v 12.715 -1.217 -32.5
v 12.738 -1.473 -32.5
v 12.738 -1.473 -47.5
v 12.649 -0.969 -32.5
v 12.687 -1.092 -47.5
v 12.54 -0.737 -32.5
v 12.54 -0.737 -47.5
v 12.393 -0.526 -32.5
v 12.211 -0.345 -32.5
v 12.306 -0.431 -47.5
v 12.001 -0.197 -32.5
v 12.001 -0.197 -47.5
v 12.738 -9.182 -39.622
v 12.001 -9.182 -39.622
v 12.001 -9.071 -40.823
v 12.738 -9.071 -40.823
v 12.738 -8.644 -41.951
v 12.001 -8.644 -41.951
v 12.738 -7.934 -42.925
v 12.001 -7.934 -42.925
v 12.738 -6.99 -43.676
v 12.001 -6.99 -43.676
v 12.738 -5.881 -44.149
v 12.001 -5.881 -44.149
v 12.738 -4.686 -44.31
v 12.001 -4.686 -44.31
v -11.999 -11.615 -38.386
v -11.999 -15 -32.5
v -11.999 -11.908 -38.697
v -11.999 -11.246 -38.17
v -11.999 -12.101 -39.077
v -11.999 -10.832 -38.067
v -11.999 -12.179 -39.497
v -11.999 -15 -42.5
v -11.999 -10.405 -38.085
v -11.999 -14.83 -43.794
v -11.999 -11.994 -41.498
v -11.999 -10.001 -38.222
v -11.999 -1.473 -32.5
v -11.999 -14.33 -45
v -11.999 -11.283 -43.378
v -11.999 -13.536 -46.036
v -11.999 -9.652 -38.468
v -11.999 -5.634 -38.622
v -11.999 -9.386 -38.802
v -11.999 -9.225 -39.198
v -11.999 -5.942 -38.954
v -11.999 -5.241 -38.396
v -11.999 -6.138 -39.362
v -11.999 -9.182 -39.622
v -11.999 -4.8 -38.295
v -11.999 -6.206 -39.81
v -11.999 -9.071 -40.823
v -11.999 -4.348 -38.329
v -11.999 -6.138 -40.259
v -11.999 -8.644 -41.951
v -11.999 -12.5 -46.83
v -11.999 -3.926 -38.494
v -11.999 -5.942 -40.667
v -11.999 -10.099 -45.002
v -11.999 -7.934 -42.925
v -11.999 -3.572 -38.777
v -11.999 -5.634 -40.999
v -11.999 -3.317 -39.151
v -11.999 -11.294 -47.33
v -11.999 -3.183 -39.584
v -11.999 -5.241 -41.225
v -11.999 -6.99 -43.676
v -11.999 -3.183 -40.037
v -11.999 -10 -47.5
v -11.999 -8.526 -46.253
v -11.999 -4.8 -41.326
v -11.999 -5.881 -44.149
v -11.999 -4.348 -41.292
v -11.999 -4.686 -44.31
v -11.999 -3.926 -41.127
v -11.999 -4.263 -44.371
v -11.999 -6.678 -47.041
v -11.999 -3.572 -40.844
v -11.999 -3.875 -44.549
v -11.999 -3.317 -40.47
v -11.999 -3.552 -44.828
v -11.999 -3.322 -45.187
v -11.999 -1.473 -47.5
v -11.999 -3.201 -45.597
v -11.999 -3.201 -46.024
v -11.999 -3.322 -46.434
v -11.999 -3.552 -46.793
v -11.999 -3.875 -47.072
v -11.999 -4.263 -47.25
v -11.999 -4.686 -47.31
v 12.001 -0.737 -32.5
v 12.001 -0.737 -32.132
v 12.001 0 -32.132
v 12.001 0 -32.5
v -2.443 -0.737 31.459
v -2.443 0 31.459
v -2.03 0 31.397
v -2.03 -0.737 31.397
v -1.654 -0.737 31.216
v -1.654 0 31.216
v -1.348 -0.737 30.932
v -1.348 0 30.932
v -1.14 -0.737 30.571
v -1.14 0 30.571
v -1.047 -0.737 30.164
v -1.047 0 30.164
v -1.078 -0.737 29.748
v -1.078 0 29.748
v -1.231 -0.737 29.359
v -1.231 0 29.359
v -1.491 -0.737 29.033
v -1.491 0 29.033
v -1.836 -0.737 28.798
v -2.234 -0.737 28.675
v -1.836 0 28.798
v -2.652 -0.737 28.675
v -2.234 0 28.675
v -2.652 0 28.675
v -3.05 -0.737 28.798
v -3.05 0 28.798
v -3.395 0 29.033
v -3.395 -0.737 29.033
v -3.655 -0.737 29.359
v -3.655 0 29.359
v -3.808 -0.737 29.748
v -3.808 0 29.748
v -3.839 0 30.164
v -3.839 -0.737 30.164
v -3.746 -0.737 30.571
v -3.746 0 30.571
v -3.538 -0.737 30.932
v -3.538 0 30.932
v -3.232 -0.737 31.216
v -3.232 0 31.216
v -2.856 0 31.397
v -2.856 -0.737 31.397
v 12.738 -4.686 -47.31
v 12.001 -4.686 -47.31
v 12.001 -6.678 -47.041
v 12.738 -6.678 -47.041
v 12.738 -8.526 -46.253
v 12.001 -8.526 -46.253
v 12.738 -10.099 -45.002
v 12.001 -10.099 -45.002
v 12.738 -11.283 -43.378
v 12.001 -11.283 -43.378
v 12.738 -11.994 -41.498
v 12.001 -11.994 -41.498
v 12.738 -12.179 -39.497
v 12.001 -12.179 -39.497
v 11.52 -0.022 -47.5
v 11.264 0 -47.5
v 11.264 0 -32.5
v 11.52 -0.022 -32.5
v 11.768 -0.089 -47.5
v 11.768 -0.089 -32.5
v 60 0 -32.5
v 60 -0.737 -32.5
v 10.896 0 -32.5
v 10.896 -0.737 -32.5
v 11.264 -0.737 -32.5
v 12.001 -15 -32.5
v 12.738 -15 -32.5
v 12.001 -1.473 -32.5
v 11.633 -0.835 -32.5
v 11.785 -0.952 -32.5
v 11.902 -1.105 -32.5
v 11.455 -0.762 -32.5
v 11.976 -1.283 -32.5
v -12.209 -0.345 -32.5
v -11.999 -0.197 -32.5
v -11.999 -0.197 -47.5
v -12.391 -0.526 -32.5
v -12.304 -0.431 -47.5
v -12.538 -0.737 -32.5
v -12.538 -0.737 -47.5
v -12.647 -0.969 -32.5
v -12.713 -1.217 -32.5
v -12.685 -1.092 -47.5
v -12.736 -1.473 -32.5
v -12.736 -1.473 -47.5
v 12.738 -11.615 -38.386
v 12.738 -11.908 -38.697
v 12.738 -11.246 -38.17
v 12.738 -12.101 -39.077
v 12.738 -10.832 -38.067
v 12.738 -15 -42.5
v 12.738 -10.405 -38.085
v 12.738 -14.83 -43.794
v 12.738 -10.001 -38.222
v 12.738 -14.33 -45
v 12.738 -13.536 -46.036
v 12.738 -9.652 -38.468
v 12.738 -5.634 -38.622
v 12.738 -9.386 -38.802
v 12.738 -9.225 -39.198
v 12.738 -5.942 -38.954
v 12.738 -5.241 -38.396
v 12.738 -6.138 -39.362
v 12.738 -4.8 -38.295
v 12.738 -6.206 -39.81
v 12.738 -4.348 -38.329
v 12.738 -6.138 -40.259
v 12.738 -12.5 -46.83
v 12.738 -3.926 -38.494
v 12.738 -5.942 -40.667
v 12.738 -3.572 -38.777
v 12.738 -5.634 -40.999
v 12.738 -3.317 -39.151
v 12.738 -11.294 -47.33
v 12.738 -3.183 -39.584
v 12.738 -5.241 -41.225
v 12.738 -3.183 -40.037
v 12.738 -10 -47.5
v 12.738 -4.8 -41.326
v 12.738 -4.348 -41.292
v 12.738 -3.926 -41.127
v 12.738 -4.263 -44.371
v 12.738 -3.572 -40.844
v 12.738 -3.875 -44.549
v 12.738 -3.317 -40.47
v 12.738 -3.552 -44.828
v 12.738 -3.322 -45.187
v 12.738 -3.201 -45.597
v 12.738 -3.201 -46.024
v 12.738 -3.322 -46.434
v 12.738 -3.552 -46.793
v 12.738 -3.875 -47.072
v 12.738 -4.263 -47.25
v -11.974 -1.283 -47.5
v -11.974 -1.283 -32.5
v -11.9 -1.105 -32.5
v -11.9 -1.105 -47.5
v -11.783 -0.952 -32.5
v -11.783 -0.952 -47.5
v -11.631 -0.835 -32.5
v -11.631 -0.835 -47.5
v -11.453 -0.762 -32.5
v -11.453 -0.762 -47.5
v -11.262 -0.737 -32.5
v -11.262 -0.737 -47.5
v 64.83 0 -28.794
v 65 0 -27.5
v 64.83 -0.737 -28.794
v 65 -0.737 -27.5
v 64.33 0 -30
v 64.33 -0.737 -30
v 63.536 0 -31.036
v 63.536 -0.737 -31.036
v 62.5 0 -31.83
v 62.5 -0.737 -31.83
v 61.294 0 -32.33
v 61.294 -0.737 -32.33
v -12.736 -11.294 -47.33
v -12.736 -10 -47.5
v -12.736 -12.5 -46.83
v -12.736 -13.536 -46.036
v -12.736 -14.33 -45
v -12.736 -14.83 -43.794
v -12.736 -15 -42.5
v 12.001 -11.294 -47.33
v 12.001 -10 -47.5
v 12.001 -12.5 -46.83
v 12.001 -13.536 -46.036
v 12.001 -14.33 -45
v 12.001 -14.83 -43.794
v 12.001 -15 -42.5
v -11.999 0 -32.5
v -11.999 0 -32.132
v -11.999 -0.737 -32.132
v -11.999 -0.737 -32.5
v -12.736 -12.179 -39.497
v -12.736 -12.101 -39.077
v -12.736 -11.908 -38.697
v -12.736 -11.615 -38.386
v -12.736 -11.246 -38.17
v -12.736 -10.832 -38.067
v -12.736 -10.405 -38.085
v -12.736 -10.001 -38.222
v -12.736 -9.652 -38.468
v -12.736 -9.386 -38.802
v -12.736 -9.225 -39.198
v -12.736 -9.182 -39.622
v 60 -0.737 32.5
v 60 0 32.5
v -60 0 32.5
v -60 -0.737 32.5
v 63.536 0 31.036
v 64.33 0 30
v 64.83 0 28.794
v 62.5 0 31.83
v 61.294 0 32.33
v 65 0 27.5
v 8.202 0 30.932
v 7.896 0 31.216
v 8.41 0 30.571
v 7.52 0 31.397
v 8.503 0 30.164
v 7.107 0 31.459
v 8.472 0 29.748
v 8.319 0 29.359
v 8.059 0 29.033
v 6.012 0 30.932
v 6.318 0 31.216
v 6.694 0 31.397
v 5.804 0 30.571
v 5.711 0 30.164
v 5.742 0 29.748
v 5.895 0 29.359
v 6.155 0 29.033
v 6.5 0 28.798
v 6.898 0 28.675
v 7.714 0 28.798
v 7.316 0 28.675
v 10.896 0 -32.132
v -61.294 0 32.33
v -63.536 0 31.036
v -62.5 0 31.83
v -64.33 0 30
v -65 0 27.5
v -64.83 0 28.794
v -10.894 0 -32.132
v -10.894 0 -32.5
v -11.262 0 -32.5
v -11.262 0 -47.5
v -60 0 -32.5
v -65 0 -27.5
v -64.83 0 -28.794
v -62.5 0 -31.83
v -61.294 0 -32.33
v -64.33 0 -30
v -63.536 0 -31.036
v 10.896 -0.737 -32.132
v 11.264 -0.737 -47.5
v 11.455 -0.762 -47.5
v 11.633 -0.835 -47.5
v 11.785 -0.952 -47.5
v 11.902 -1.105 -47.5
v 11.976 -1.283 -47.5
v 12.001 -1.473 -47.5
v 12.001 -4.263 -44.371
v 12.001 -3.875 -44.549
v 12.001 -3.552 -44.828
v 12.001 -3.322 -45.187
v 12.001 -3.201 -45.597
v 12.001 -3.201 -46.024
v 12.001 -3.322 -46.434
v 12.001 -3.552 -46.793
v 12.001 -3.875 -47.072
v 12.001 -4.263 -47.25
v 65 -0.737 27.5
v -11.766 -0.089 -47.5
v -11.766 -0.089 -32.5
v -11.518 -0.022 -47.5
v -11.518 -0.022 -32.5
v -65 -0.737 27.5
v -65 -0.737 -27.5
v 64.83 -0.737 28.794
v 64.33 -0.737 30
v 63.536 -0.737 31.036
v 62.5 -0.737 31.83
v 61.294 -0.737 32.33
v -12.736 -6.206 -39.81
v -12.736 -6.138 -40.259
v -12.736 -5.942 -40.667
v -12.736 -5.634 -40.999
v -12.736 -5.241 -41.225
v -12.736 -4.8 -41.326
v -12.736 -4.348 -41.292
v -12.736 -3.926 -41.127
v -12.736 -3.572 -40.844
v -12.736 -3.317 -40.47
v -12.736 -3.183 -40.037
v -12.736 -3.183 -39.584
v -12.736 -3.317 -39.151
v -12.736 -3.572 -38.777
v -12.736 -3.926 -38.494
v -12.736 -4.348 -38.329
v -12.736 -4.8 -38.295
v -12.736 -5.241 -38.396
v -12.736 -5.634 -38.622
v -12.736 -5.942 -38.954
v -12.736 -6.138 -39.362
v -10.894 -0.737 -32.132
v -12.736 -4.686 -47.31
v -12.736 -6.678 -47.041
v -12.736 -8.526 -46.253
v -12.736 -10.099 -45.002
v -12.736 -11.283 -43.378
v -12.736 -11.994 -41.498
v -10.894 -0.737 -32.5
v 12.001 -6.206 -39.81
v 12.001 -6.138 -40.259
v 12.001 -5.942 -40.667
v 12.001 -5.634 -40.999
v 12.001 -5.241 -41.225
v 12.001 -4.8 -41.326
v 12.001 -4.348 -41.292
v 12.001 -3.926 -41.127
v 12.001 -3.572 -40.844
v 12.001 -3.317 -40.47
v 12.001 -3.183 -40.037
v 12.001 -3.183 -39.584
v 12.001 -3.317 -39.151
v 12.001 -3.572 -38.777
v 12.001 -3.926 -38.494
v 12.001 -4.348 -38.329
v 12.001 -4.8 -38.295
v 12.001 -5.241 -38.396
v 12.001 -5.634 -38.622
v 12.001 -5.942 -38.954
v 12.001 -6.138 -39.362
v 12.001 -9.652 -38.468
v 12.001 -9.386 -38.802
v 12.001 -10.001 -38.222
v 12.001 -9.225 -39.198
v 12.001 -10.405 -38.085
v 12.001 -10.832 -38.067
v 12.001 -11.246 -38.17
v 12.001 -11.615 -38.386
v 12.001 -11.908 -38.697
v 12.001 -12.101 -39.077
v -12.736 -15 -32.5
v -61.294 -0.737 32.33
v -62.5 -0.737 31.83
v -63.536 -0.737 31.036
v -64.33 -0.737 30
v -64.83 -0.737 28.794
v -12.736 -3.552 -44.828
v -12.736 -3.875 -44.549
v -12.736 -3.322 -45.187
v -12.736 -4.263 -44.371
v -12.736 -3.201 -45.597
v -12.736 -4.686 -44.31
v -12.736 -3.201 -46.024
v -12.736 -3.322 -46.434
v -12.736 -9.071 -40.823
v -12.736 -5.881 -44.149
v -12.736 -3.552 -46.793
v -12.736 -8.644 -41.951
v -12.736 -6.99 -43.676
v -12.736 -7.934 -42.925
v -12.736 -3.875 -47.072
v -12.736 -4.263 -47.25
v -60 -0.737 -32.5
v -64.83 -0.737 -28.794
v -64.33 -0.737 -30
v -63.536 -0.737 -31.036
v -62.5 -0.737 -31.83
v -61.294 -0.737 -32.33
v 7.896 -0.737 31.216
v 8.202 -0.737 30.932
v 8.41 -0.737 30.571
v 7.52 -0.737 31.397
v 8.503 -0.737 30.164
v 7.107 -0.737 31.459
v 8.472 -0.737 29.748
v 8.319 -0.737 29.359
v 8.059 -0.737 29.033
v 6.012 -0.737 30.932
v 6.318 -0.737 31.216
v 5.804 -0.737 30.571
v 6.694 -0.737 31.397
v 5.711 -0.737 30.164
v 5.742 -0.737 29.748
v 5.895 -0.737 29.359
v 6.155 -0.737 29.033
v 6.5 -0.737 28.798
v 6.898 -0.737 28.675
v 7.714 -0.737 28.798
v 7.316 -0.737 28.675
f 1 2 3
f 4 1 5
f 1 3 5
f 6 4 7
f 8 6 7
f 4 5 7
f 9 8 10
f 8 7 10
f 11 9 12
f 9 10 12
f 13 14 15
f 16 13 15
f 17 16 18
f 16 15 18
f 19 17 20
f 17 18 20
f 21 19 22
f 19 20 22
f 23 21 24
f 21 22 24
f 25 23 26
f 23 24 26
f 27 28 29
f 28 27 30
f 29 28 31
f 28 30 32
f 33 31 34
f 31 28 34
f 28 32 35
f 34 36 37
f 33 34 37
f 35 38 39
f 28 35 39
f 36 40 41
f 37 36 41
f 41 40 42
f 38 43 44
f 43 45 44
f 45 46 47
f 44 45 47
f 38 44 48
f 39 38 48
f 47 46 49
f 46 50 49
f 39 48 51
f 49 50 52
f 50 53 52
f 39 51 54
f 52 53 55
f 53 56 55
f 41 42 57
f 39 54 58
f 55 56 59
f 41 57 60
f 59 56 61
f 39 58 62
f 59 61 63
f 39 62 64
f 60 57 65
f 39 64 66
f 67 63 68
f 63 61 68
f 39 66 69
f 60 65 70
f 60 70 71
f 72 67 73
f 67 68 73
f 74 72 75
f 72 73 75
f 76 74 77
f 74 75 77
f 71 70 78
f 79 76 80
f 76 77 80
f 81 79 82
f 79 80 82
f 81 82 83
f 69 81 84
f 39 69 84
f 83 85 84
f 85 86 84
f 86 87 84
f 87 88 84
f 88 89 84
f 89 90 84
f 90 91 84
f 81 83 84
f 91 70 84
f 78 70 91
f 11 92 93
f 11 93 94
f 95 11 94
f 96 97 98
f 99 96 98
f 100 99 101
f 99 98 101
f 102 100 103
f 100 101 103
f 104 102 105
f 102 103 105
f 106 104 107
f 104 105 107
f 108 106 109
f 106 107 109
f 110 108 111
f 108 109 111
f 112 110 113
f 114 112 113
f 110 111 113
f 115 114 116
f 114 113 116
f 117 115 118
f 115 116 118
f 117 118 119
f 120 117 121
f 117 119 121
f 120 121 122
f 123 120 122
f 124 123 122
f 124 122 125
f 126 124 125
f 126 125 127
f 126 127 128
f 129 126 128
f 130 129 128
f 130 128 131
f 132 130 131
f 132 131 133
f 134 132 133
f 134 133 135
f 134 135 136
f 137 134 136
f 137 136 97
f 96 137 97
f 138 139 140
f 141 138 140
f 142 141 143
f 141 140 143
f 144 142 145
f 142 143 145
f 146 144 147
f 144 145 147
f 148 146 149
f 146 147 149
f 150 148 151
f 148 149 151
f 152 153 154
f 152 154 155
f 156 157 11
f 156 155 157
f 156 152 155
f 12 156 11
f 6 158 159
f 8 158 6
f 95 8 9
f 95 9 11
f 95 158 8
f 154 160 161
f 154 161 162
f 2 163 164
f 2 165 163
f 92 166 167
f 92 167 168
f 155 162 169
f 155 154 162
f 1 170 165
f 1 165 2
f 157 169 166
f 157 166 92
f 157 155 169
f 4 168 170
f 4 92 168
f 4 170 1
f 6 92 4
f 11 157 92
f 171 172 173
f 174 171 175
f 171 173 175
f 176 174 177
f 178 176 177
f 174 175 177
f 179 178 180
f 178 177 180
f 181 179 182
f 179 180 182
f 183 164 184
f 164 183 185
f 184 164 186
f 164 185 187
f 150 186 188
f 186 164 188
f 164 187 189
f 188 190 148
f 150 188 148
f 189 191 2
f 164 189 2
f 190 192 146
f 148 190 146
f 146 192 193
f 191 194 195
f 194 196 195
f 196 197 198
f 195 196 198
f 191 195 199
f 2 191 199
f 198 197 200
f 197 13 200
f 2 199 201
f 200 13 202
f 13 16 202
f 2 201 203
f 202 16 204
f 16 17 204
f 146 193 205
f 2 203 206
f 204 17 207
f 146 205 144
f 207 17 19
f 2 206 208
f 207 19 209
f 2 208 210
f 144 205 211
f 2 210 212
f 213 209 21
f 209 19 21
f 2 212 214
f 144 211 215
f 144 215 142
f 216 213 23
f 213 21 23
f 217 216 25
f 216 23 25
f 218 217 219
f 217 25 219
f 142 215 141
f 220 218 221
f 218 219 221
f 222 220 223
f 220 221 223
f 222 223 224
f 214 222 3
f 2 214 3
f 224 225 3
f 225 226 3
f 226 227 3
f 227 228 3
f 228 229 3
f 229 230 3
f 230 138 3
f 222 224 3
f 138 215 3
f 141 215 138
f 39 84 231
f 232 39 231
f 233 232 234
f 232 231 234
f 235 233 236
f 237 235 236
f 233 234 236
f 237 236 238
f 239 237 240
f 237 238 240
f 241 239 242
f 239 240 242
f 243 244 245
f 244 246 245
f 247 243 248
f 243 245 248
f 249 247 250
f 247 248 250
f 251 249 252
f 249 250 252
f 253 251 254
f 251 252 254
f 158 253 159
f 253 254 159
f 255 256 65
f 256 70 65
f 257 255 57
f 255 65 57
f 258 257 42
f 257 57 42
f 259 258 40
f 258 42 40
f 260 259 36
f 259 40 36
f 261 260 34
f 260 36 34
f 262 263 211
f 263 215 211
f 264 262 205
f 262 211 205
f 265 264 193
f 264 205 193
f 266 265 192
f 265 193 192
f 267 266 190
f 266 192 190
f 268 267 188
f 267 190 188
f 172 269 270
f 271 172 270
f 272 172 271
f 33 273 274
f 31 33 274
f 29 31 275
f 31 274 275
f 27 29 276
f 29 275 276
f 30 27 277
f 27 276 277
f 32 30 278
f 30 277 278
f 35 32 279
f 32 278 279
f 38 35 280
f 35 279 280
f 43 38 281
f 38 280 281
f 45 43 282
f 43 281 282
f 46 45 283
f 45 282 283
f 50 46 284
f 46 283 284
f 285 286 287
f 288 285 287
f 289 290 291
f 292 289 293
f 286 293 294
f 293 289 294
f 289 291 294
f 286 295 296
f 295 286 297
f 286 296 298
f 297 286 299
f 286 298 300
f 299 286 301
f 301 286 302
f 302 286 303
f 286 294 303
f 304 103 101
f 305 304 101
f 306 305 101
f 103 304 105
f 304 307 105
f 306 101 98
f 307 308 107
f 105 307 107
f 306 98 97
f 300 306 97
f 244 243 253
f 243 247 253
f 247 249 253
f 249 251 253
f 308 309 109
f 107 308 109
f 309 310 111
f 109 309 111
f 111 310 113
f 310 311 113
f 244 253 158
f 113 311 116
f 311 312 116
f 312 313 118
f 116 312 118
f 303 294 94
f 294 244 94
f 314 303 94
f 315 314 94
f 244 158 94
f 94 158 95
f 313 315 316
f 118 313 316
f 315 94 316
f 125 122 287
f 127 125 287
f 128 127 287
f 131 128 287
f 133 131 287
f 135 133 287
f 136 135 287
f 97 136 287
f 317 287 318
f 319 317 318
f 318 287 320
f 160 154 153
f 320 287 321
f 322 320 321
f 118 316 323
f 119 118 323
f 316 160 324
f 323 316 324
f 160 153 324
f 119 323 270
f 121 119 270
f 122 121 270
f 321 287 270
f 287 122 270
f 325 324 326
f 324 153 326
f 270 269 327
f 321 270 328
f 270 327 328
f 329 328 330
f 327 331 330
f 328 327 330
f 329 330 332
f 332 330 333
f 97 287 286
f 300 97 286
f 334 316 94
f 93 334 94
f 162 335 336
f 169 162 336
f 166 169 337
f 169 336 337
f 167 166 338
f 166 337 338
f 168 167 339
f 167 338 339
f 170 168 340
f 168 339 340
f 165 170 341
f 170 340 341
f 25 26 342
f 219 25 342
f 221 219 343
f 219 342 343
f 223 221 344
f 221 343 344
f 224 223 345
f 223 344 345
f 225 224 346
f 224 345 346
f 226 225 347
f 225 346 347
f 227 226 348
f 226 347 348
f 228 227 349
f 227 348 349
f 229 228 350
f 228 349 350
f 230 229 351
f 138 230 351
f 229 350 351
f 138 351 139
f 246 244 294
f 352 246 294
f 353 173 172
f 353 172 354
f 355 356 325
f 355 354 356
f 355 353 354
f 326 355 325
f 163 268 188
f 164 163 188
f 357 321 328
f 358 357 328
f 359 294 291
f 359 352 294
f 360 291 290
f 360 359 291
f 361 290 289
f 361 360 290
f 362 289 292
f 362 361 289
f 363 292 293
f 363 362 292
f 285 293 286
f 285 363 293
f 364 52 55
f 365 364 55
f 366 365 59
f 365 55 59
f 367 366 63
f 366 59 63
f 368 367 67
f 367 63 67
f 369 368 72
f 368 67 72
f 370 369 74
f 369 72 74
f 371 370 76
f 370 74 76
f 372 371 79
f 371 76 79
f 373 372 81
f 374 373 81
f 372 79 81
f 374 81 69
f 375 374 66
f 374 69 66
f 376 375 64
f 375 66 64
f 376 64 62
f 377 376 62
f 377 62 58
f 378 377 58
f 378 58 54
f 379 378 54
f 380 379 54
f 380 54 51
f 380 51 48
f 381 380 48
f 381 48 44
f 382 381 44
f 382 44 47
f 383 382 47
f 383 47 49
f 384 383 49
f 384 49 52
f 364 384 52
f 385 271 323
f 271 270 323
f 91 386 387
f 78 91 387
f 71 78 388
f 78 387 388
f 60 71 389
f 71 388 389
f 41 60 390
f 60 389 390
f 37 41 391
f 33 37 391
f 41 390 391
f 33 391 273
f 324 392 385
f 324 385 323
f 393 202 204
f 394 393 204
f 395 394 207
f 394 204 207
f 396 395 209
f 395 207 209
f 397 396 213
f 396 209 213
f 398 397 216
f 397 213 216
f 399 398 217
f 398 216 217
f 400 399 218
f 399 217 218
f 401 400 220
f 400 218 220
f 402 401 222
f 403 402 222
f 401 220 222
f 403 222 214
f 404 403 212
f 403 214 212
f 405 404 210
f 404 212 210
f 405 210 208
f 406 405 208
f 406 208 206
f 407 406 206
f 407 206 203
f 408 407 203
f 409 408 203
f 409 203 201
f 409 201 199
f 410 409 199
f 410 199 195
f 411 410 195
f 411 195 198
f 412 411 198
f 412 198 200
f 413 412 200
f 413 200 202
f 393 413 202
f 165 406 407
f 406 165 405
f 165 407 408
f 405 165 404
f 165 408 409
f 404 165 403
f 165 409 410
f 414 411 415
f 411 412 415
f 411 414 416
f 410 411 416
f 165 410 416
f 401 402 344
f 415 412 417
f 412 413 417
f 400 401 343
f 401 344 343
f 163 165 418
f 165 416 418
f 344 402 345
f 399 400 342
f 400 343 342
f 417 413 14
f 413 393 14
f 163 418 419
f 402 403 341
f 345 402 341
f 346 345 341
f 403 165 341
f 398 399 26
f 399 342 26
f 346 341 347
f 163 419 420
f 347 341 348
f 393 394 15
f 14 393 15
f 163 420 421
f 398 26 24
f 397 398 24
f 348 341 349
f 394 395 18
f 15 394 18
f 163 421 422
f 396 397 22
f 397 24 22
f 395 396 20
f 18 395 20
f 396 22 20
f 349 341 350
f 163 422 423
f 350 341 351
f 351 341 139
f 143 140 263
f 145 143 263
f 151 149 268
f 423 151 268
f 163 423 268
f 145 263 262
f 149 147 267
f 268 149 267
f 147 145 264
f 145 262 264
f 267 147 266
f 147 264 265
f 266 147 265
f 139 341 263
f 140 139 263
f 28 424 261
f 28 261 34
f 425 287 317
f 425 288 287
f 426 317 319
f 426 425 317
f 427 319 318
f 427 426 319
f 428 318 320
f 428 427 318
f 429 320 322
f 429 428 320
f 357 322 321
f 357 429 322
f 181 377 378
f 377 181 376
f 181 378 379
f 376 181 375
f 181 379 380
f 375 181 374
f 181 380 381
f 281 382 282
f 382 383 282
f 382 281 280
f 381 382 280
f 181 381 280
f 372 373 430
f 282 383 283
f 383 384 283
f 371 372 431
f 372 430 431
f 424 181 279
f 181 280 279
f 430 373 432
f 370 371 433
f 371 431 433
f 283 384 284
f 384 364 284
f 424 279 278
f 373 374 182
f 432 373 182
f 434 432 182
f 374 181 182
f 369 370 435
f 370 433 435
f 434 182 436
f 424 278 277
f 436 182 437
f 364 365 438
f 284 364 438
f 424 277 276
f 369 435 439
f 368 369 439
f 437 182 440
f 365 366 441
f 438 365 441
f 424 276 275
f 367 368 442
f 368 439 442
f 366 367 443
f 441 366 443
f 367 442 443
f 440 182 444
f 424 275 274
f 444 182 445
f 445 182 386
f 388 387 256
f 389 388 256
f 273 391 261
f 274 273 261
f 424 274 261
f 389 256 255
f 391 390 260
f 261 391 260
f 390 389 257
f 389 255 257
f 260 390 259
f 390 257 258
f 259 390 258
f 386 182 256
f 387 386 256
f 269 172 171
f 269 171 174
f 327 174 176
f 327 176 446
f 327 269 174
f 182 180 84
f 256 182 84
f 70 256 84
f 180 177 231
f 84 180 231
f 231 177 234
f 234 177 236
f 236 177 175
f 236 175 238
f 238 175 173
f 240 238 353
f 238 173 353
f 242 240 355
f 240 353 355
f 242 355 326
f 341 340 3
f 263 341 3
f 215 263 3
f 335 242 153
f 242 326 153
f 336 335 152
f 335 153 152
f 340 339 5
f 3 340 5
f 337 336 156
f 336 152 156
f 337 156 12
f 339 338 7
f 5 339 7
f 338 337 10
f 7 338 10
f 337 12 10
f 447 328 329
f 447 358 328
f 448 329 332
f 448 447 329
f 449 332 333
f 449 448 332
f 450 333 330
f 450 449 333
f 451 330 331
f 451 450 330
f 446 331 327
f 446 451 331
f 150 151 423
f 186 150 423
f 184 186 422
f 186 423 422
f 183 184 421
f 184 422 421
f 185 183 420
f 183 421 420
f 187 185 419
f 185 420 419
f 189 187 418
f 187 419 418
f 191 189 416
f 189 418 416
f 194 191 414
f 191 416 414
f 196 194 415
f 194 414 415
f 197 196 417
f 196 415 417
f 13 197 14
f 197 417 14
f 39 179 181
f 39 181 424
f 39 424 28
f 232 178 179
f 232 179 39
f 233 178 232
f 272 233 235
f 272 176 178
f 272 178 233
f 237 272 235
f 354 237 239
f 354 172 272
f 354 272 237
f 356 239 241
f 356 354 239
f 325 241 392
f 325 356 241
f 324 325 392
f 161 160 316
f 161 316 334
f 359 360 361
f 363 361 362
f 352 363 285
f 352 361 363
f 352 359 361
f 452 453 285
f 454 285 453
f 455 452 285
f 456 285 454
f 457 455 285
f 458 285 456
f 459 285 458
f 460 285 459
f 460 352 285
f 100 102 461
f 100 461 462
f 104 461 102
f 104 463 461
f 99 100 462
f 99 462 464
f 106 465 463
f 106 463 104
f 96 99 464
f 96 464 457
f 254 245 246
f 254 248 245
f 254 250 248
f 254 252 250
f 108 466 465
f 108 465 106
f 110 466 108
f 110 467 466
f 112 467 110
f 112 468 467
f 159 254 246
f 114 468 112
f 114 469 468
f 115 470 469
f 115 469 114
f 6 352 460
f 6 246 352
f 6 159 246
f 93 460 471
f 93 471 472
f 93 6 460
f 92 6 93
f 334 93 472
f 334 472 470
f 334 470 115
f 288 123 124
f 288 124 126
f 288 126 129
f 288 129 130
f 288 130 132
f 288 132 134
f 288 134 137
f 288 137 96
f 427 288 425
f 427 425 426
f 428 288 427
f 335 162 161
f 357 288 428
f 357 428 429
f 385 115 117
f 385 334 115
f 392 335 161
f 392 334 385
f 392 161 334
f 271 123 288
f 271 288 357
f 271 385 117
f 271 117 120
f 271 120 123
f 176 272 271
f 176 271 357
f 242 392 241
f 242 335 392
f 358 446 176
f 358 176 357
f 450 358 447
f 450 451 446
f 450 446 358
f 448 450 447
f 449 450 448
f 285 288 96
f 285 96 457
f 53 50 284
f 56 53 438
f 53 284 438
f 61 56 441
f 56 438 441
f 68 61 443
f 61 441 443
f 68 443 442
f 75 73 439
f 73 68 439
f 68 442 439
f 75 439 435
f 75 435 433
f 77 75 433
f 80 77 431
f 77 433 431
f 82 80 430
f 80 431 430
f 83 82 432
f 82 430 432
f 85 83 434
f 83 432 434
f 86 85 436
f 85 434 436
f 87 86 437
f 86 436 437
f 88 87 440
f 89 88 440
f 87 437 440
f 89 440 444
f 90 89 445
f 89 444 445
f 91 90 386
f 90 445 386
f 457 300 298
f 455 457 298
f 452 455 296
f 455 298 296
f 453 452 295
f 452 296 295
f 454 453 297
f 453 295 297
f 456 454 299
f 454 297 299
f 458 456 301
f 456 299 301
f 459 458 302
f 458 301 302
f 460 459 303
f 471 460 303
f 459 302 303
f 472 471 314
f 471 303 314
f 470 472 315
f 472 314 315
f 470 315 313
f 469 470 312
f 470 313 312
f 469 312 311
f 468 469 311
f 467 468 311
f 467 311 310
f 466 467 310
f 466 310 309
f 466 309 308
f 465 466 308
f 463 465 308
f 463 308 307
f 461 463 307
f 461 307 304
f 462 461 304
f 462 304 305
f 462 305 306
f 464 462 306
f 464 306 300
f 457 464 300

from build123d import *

# Parameters (mm, degrees)
BASE_FLANGE1_DEPTH   = 0.7366
FILLET1_R            = 5
FILLET2_R            = 5
FILLET3_R            = 5
FILLET4_R            = 5
EDGE_FLANGE2_START   = -47.5
EDGE_FLANGE2_DEPTH   = 15.3683
EDGE_FLANGE2_START_2 = -32.5
EDGE_FLANGE2_2_DEPTH = 0.3683
EDGE_FLANGE2_3_DEPTH = 15
FILLET7_R            = 5
FILLET8_R            = 5
SKETCH18_R           = 1.5
CUT_EXTRUDE1_DEPTH   = 40
SKETCH23_R           = 1.52
CUT_EXTRUDE6_DEPTH   = 30
SKETCH25_R           = 1.4
CUT_EXTRUDE8_DEPTH   = 10


with BuildPart() as part:
    # Base-Flange1: sheet metal written as solids
    # Sketch1 → Base-Flange1 (new body)
    with BuildSketch(Plane(origin=(0, 0, 0), x_dir=(1, 0, 0), z_dir=(0, 1, 0))):
        Polygon((19.610938441, 32.5), (65, 32.5), (65, -32.5), (-65, -32.5), (-65, 32.5), (-19.610938441, 32.5), (-11.999061559, 32.5), (-11.999061559, 47.5), (12.000938441, 47.5), (12.000938441, 32.5), align=None)
    extrude(amount=-BASE_FLANGE1_DEPTH)

    # Fillet1
    fillet1_edges = [part.edges().sort_by_distance(p)[0] for p in [
        (65, -0.3683, 32.5),
    ]]
    fillet(fillet1_edges, radius=FILLET1_R)

    # Fillet2
    fillet2_edges = [part.edges().sort_by_distance(p)[0] for p in [
        (65, -0.3683, -32.5),
    ]]
    fillet(fillet2_edges, radius=FILLET2_R)

    # Fillet3
    fillet3_edges = [part.edges().sort_by_distance(p)[0] for p in [
        (-65, -0.3683, 32.5),
    ]]
    fillet(fillet3_edges, radius=FILLET3_R)

    # Fillet4
    fillet4_edges = [part.edges().sort_by_distance(p)[0] for p in [
        (-65, -0.3683, -32.5),
    ]]
    fillet(fillet4_edges, radius=FILLET4_R)

    # Edge-Flange2: read off the stored shape, not the designer's step
    # Edge-Flange2 outline → Edge-Flange2 (cut)
    with BuildSketch(Plane.XY.offset(EDGE_FLANGE2_START)):
        with BuildLine():
            ThreePointArc((-11.999061559, -0.197371375), (-11.643753776, -0.050198073), (-11.262461559, 0))
            Line((-11.262461559, 0), (-11.999061559, 0))
            Line((-11.999061559, 0), (-11.999061559, -0.197371375))
        make_face()
        with BuildLine():
            ThreePointArc((11.264338441, 0), (11.645630659, -0.050198073), (12.000938441, -0.197371375))
            Line((12.000938441, -0.197371375), (12.000938441, 0))
            Line((12.000938441, 0), (11.264338441, 0))
        make_face()
    extrude(amount=EDGE_FLANGE2_DEPTH, mode=Mode.SUBTRACT)

    # Edge-Flange2 2 outline → Edge-Flange2 2 (cut)
    with BuildSketch(Plane.XY.offset(EDGE_FLANGE2_START_2)):
        with BuildLine():
            Line((-11.999061559, -0.7366), (-10.894161559, -0.7366))
            Line((-10.894161559, -0.7366), (-10.894161559, 0))
            Line((-10.894161559, 0), (-11.262461559, 0))
            ThreePointArc((-11.262461559, 0), (-11.643753776, -0.050198073), (-11.999061559, -0.197371375))
            Line((-11.999061559, -0.197371375), (-11.999061559, -0.7366))
        make_face()
        with BuildLine():
            Line((12.000938441, -0.7366), (12.000938441, -0.197371375))
            ThreePointArc((12.000938441, -0.197371375), (11.645630659, -0.050198073), (11.264338441, 0))
            Line((11.264338441, 0), (10.896038441, 0))
            Line((10.896038441, 0), (10.896038441, -0.7366))
            Line((10.896038441, -0.7366), (12.000938441, -0.7366))
        make_face()
    extrude(amount=EDGE_FLANGE2_2_DEPTH, mode=Mode.SUBTRACT)

    # Edge-Flange2 3 outline → Edge-Flange2 3 (add)
    with BuildSketch(Plane.XY.offset(EDGE_FLANGE2_START)):
        with BuildLine():
            ThreePointArc((-11.999061559, -1.4732), (-11.783316414, -0.952345145), (-11.262461559, -0.7366))
            Line((-11.262461559, -0.7366), (-11.999061559, -0.7366))
            Line((-11.999061559, -0.7366), (-11.999061559, -0.197371375))
            ThreePointArc((-11.999061559, -0.197371375), (-12.538290183, -0.7366), (-12.735661559, -1.4732))
            Line((-12.735661559, -1.4732), (-12.735661559, -15))
            Line((-12.735661559, -15), (-11.999061559, -15))
            Line((-11.999061559, -15), (-11.999061559, -1.4732))
        make_face()
        with BuildLine():
            Line((12.737538441, -15), (12.737538441, -1.4732))
            ThreePointArc((12.737538441, -1.4732), (12.540167066, -0.7366), (12.000938441, -0.197371375))
            Line((12.000938441, -0.197371375), (12.000938441, -0.7366))
            Line((12.000938441, -0.7366), (11.264338441, -0.7366))
            ThreePointArc((11.264338441, -0.7366), (11.785193296, -0.952345145), (12.000938441, -1.4732))
            Line((12.000938441, -1.4732), (12.000938441, -15))
            Line((12.000938441, -15), (12.737538441, -15))
        make_face()
    extrude(amount=EDGE_FLANGE2_3_DEPTH)

    # Fillet7
    fillet7_edges = [part.edges().sort_by_distance(p)[0] for p in [
        (12.369238441, -15, -47.5),
    ]]
    fillet(fillet7_edges, radius=FILLET7_R)

    # Fillet8
    fillet8_edges = [part.edges().sort_by_distance(p)[0] for p in [
        (-12.367361559, -15, -47.5),
    ]]
    fillet(fillet8_edges, radius=FILLET8_R)

    # Sketch18 → Cut-Extrude1 (cut)
    with BuildSketch(Plane.ZY.offset(12.735661559)):
        with Locations(Location((-39.810498868, -4.68598948, 0), (0, 0, 270))):
            Circle(SKETCH18_R)
        with BuildLine():
            ThreePointArc((-39.496869826, -12.179429066), (-38.060907717, -10.61801534), (-39.622321443, -9.182053232))
            ThreePointArc((-39.622321443, -9.182053232), (-42.925238149, -7.933819403), (-44.310498868, -4.68598948))
            ThreePointArc((-44.310498868, -4.68598948), (-45.810498868, -3.18598948), (-47.310498868, -4.68598948))
            ThreePointArc((-47.310498868, -4.68598948), (-45.001731004, -10.099039351), (-39.496869826, -12.179429066))
        make_face()
    extrude(amount=-CUT_EXTRUDE1_DEPTH, mode=Mode.SUBTRACT)

    # Sketch23 → Cut-Extrude6 (cut)
    with BuildSketch(Plane(origin=(13.900294902, -27.805223525, -244.007014279), x_dir=(-3.6601011800335994e-15, 0.31934249234828205, -0.9476393684207024), z_dir=(1, 0, 0))):
        with Locations(Location((-186.121703077, 87.117320509, 0), (0, 0, 251.376833723))):
            Circle(SKETCH23_R)
    extrude(amount=-CUT_EXTRUDE6_DEPTH, mode=Mode.SUBTRACT)

    # Sketch25 → Cut-Extrude8 (cut)
    with BuildSketch(Plane(origin=(-71.983966672, 0, -96.098250098), x_dir=(1, 0, 0), z_dir=(0, 1, 0))):
        with Locations(Location((79.090906604, -126.157708005, 0), (0, 0, 270))):
            Circle(SKETCH25_R)
        with Locations(Location((69.540906604, -126.157708005, 0), (0, 0, 270))):
            Circle(SKETCH25_R)
    extrude(amount=-CUT_EXTRUDE8_DEPTH, mode=Mode.SUBTRACT)


solid = part.part
